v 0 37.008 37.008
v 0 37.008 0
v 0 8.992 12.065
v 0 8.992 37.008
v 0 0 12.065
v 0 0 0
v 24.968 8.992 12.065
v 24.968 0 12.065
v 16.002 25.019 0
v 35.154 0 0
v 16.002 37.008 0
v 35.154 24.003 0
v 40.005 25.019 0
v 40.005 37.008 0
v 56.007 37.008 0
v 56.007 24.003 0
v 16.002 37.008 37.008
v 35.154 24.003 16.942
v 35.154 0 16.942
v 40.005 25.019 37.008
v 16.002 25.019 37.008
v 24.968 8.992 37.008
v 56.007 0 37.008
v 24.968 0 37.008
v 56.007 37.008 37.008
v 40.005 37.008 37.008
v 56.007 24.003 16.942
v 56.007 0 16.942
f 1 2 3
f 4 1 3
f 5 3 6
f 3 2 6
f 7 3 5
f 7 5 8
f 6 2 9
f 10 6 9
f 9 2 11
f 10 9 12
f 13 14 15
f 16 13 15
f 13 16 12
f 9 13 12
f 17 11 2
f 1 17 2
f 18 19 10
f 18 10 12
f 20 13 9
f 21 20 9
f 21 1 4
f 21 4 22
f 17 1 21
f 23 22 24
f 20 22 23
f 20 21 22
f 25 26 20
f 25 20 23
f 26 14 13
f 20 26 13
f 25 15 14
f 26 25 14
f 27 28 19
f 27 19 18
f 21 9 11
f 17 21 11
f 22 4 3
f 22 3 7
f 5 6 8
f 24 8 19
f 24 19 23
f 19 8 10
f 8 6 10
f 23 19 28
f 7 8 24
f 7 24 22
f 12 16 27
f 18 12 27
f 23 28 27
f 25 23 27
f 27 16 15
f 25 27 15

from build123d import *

# Parameters (mm, degrees)
F1_DEPTH = 37.0078
F2_W     = 24.9682
F2_H     = 8.9916
F3_DEPTH = 24.9428
F4_W     = 24.003
F4_H     = 16.9418
F5_DEPTH = 20.8534


with BuildPart() as f1:
    # F0 (on Top) → F1 (new body)
    with BuildSketch(Plane.XY):
        Polygon((0, 37.0078), (0, 0), (56.007, 0), (56.007, 37.0078), (40.005, 37.0078), (40.005, 25.019), (16.002, 25.019), (16.002, 37.0078), align=None)
    extrude(amount=F1_DEPTH)

    # F2 (on face) → F3 (cut)
    with BuildSketch(Plane.XY.offset(37.0078)):
        with Locations((12.4841, 4.4958)):
            Rectangle(F2_W, F2_H)
    extrude(amount=-F3_DEPTH, mode=Mode.SUBTRACT)

    # F4 (on face) → F5 (cut)
    with BuildSketch(Plane.YZ.offset(56.007)):
        with Locations((12.0015, 8.4709)):
            Rectangle(F4_W, F4_H)
    extrude(amount=-F5_DEPTH, mode=Mode.SUBTRACT)


solid = f1.part
